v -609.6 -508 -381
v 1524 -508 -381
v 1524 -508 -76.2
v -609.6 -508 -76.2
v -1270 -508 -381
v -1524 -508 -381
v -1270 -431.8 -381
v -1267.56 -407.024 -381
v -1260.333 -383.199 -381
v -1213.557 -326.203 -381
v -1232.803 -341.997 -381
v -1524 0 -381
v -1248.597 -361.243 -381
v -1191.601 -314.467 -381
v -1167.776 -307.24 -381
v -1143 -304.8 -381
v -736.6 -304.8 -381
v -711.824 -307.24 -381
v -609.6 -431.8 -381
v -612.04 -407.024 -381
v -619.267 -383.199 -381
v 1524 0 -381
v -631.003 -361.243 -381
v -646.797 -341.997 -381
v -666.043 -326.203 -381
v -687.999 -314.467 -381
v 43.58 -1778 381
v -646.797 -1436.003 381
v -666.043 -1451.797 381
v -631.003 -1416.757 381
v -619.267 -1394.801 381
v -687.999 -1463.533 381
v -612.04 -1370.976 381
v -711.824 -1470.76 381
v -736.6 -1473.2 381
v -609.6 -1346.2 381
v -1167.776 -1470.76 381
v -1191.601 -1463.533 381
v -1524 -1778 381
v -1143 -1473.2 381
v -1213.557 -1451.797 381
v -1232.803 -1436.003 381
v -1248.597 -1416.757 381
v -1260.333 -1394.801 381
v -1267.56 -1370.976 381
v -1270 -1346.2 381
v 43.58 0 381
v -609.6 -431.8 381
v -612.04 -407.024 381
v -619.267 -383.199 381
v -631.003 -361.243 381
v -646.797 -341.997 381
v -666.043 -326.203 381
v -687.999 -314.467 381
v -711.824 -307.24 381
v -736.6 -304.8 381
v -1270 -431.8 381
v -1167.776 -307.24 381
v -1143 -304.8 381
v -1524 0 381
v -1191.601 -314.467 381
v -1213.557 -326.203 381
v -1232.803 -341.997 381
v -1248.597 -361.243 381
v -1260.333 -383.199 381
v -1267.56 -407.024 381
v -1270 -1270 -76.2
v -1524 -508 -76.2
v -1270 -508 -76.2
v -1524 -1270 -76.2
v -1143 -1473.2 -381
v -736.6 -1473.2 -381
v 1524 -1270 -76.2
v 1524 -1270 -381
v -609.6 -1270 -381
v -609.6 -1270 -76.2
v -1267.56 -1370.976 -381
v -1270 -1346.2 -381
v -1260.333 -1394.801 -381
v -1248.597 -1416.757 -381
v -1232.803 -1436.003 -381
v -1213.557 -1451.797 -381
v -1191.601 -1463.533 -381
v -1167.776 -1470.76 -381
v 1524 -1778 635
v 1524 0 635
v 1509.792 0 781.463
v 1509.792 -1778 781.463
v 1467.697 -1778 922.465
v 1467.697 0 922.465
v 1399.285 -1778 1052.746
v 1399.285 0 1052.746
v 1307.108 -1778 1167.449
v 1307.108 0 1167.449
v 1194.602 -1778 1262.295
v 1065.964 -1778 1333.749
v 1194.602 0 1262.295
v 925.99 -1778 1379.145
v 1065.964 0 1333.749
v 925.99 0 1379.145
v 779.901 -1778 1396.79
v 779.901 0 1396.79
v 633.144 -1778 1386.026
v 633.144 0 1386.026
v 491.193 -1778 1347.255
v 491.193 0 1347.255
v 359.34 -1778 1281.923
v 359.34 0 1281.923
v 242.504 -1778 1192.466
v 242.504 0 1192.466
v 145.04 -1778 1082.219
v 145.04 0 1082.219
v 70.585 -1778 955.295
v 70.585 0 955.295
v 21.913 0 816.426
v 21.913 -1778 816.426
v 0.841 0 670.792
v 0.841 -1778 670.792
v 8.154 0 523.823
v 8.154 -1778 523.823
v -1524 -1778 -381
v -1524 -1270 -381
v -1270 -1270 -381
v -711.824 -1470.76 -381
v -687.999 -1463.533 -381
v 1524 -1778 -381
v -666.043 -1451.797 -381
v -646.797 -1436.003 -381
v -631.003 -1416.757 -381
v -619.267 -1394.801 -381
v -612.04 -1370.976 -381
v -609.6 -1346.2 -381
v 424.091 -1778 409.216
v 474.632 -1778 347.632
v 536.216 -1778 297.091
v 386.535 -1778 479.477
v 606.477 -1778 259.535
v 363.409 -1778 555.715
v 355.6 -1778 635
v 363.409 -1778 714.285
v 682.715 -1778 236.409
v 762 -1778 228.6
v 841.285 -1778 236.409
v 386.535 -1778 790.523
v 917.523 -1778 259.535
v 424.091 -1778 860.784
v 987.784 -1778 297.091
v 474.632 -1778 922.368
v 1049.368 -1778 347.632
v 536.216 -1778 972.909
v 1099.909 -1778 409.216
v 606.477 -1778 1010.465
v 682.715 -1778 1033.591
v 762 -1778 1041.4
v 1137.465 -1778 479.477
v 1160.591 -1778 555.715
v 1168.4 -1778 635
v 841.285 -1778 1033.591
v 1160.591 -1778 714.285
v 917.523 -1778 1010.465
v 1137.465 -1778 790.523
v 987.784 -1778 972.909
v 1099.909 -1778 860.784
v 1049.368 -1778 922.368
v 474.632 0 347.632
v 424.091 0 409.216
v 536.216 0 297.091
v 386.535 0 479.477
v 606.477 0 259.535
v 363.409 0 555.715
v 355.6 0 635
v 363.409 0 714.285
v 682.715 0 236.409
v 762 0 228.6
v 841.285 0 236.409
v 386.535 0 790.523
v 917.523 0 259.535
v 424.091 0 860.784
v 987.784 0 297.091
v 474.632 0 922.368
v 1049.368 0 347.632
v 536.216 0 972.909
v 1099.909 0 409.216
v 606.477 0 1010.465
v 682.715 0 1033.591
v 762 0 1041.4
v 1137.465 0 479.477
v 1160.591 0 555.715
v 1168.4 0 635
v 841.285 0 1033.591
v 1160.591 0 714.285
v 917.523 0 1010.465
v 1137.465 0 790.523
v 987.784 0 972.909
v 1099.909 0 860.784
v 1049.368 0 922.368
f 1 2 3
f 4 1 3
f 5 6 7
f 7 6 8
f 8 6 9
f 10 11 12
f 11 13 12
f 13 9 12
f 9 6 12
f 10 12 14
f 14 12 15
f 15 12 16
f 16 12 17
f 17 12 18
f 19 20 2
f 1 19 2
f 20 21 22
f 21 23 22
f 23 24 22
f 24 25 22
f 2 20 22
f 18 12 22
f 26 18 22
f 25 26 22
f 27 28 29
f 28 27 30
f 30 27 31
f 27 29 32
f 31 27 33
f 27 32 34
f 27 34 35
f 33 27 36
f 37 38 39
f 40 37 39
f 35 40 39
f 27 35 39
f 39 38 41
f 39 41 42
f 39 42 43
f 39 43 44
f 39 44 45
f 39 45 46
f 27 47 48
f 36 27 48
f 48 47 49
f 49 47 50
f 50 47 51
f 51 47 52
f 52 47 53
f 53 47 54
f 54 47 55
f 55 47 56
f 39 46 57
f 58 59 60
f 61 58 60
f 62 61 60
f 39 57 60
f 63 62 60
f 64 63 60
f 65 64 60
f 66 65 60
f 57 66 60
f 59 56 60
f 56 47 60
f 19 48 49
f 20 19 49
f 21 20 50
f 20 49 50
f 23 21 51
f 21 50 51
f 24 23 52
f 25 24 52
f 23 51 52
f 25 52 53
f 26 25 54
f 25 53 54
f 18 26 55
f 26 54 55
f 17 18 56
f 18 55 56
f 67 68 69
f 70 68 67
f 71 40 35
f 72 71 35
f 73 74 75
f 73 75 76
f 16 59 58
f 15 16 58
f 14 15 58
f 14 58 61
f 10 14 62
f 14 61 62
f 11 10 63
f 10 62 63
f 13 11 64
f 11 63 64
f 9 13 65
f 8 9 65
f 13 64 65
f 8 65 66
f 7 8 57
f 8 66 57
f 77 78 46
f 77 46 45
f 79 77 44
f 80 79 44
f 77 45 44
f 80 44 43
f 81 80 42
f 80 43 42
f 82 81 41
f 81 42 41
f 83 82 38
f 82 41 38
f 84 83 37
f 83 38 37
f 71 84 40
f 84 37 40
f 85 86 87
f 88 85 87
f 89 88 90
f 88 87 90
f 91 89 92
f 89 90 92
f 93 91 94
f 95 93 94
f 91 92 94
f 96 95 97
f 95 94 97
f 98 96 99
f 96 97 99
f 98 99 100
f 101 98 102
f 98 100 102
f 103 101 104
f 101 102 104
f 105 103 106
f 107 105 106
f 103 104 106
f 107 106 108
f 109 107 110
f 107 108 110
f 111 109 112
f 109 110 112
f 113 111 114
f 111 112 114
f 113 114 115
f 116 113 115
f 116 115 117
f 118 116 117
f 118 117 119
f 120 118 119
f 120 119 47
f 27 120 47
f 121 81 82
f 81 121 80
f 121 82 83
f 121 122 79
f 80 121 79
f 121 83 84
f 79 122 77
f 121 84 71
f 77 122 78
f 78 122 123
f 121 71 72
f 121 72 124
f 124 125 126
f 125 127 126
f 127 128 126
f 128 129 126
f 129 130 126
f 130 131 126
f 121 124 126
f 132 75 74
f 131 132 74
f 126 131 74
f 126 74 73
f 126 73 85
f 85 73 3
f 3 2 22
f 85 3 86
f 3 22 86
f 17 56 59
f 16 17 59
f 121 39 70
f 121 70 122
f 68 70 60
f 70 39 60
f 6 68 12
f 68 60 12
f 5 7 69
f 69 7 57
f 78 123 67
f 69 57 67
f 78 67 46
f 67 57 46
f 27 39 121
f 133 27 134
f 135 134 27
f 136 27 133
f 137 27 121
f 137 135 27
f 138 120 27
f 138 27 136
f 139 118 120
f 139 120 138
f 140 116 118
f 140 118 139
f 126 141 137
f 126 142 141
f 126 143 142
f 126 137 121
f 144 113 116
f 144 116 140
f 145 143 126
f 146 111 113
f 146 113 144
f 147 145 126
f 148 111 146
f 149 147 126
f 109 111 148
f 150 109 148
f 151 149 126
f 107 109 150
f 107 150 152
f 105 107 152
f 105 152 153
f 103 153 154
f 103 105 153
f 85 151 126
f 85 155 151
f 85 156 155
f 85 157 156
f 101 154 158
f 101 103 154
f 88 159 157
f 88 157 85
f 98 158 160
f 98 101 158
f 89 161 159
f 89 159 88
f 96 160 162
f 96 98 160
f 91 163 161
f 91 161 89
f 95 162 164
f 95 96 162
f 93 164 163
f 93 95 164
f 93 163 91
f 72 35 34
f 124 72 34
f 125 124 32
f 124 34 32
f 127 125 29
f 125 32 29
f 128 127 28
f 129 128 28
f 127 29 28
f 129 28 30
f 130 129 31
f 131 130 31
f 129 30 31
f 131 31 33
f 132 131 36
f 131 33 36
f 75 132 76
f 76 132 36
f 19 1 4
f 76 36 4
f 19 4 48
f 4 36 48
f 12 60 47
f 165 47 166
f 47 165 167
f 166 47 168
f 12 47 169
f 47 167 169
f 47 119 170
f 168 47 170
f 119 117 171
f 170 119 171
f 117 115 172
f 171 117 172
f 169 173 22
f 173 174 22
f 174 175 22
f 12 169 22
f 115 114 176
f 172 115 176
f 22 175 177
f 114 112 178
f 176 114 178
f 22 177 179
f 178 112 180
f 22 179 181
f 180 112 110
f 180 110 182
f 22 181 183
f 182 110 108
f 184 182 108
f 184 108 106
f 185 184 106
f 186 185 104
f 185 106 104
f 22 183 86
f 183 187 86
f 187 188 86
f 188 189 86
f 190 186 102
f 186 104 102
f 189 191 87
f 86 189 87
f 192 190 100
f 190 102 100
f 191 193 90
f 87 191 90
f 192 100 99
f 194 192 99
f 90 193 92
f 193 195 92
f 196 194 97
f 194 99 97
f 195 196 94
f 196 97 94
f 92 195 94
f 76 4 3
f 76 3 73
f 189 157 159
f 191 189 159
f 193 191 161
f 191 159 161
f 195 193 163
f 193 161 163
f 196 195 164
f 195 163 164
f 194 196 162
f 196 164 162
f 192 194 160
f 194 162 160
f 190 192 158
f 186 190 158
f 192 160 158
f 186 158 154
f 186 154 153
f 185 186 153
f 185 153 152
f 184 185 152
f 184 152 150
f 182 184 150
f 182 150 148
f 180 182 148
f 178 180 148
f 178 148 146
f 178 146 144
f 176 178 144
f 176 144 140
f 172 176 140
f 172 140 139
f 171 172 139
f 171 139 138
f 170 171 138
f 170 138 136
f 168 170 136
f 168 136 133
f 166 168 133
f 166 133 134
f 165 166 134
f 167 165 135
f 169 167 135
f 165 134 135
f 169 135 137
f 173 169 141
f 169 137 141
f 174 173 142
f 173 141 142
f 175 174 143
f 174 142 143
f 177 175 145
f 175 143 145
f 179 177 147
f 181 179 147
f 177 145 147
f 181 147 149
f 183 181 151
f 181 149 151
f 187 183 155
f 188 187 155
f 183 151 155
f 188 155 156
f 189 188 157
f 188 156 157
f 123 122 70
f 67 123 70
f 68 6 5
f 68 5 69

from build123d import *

# Parameters (mm, degrees)
F1_DEPTH = 1778
F2_R     = 406.4
F3_DEPTH = 25.4
F4_DEPTH = 1803.401
F5_W     = 762
F5_H     = 304.8
F6_DEPTH = 3048.001
F8_DEPTH = 762.001


with BuildPart() as f1:
    # F0 (on Front) → F1 (new body)
    with BuildSketch(Plane.XZ):
        with BuildLine():
            Line((-1524, 381), (-1524, -381))
            Line((-1524, -381), (762, -381))
            Line((762, -381), (762, -127))
            ThreePointArc((762, -127), (322.0590948775, 12.8296053331), (43.5795103145, 381))
            Line((43.5795103145, 381), (-1524, 381))
        make_face()
        with BuildLine():
            Line((762, -127), (762, -381))
            Line((762, -381), (1524, -381))
            Line((1524, -381), (1524, 381))
            Line((1524, 381), (1480.4204896855, 381))
            ThreePointArc((1480.4204896855, 381), (1201.9409051225, 12.8296053331), (762, -127))
        make_face()
        with BuildLine():
            ThreePointArc((43.5795103145, 381), (322.0590948775, 12.8296053331), (762, -127))
            ThreePointArc((762, -127), (1201.9409051225, 12.8296053331), (1480.4204896855, 381))
            Line((1480.4204896855, 381), (43.5795103145, 381))
        make_face()
        with BuildLine():
            ThreePointArc((1524, 635), (633.144292211, 1386.026102456), (43.5795103145, 381))
            Line((43.5795103145, 381), (1480.4204896855, 381))
            ThreePointArc((1480.4204896855, 381), (1513.026102456, 506.144292211), (1524, 635))
        make_face()
        with BuildLine():
            Line((1480.4204896855, 381), (1524, 381))
            Line((1524, 381), (1524, 635))
            ThreePointArc((1524, 635), (1513.026102456, 506.144292211), (1480.4204896855, 381))
        make_face()
    extrude(amount=F1_DEPTH)

    # F2 (on face) → F3 (join)
    with BuildSketch(Plane.XZ.offset(1778)):
        with Locations((762, 635)):
            Circle(F2_R)
    extrude(amount=F3_DEPTH)

    # F4 (cut, through all): a face of the model
    f4_faces = [f1.faces().sort_by_distance(p)[0] for p in [
        (762, -1803.4, 635),
    ]]
    extrude(f4_faces, amount=-F4_DEPTH, mode=Mode.SUBTRACT)

    # F5 (on face) → F6 (cut, through all)
    with BuildSketch(Plane(origin=(-1524, 0, 0), x_dir=(0, -1, 0), z_dir=(-1, 0, 0))):
        with Locations((889, -228.6)):
            Rectangle(F5_W, F5_H)
    extrude(amount=-F6_DEPTH, mode=Mode.SUBTRACT)

    # F7 (on face) → F8 (cut, through all)
    with BuildSketch(Plane.XY.offset(381)):
        with BuildLine():
            Line((-1270, -431.8), (-1270, -1346.2))
            ThreePointArc((-1270, -1346.2), (-1232.8025612107, -1436.0025612107), (-1143, -1473.2))
            Line((-1143, -1473.2), (-736.6, -1473.2))
            ThreePointArc((-736.6, -1473.2), (-646.7974387893, -1436.0025612107), (-609.6, -1346.2))
            Line((-609.6, -1346.2), (-609.6, -431.8))
            ThreePointArc((-609.6, -431.8), (-646.7974387893, -341.9974387893), (-736.6, -304.8))
            Line((-736.6, -304.8), (-1143, -304.8))
            ThreePointArc((-1143, -304.8), (-1232.8025612107, -341.9974387893), (-1270, -431.8))
        make_face()
    extrude(amount=-F8_DEPTH, mode=Mode.SUBTRACT)


solid = f1.part
